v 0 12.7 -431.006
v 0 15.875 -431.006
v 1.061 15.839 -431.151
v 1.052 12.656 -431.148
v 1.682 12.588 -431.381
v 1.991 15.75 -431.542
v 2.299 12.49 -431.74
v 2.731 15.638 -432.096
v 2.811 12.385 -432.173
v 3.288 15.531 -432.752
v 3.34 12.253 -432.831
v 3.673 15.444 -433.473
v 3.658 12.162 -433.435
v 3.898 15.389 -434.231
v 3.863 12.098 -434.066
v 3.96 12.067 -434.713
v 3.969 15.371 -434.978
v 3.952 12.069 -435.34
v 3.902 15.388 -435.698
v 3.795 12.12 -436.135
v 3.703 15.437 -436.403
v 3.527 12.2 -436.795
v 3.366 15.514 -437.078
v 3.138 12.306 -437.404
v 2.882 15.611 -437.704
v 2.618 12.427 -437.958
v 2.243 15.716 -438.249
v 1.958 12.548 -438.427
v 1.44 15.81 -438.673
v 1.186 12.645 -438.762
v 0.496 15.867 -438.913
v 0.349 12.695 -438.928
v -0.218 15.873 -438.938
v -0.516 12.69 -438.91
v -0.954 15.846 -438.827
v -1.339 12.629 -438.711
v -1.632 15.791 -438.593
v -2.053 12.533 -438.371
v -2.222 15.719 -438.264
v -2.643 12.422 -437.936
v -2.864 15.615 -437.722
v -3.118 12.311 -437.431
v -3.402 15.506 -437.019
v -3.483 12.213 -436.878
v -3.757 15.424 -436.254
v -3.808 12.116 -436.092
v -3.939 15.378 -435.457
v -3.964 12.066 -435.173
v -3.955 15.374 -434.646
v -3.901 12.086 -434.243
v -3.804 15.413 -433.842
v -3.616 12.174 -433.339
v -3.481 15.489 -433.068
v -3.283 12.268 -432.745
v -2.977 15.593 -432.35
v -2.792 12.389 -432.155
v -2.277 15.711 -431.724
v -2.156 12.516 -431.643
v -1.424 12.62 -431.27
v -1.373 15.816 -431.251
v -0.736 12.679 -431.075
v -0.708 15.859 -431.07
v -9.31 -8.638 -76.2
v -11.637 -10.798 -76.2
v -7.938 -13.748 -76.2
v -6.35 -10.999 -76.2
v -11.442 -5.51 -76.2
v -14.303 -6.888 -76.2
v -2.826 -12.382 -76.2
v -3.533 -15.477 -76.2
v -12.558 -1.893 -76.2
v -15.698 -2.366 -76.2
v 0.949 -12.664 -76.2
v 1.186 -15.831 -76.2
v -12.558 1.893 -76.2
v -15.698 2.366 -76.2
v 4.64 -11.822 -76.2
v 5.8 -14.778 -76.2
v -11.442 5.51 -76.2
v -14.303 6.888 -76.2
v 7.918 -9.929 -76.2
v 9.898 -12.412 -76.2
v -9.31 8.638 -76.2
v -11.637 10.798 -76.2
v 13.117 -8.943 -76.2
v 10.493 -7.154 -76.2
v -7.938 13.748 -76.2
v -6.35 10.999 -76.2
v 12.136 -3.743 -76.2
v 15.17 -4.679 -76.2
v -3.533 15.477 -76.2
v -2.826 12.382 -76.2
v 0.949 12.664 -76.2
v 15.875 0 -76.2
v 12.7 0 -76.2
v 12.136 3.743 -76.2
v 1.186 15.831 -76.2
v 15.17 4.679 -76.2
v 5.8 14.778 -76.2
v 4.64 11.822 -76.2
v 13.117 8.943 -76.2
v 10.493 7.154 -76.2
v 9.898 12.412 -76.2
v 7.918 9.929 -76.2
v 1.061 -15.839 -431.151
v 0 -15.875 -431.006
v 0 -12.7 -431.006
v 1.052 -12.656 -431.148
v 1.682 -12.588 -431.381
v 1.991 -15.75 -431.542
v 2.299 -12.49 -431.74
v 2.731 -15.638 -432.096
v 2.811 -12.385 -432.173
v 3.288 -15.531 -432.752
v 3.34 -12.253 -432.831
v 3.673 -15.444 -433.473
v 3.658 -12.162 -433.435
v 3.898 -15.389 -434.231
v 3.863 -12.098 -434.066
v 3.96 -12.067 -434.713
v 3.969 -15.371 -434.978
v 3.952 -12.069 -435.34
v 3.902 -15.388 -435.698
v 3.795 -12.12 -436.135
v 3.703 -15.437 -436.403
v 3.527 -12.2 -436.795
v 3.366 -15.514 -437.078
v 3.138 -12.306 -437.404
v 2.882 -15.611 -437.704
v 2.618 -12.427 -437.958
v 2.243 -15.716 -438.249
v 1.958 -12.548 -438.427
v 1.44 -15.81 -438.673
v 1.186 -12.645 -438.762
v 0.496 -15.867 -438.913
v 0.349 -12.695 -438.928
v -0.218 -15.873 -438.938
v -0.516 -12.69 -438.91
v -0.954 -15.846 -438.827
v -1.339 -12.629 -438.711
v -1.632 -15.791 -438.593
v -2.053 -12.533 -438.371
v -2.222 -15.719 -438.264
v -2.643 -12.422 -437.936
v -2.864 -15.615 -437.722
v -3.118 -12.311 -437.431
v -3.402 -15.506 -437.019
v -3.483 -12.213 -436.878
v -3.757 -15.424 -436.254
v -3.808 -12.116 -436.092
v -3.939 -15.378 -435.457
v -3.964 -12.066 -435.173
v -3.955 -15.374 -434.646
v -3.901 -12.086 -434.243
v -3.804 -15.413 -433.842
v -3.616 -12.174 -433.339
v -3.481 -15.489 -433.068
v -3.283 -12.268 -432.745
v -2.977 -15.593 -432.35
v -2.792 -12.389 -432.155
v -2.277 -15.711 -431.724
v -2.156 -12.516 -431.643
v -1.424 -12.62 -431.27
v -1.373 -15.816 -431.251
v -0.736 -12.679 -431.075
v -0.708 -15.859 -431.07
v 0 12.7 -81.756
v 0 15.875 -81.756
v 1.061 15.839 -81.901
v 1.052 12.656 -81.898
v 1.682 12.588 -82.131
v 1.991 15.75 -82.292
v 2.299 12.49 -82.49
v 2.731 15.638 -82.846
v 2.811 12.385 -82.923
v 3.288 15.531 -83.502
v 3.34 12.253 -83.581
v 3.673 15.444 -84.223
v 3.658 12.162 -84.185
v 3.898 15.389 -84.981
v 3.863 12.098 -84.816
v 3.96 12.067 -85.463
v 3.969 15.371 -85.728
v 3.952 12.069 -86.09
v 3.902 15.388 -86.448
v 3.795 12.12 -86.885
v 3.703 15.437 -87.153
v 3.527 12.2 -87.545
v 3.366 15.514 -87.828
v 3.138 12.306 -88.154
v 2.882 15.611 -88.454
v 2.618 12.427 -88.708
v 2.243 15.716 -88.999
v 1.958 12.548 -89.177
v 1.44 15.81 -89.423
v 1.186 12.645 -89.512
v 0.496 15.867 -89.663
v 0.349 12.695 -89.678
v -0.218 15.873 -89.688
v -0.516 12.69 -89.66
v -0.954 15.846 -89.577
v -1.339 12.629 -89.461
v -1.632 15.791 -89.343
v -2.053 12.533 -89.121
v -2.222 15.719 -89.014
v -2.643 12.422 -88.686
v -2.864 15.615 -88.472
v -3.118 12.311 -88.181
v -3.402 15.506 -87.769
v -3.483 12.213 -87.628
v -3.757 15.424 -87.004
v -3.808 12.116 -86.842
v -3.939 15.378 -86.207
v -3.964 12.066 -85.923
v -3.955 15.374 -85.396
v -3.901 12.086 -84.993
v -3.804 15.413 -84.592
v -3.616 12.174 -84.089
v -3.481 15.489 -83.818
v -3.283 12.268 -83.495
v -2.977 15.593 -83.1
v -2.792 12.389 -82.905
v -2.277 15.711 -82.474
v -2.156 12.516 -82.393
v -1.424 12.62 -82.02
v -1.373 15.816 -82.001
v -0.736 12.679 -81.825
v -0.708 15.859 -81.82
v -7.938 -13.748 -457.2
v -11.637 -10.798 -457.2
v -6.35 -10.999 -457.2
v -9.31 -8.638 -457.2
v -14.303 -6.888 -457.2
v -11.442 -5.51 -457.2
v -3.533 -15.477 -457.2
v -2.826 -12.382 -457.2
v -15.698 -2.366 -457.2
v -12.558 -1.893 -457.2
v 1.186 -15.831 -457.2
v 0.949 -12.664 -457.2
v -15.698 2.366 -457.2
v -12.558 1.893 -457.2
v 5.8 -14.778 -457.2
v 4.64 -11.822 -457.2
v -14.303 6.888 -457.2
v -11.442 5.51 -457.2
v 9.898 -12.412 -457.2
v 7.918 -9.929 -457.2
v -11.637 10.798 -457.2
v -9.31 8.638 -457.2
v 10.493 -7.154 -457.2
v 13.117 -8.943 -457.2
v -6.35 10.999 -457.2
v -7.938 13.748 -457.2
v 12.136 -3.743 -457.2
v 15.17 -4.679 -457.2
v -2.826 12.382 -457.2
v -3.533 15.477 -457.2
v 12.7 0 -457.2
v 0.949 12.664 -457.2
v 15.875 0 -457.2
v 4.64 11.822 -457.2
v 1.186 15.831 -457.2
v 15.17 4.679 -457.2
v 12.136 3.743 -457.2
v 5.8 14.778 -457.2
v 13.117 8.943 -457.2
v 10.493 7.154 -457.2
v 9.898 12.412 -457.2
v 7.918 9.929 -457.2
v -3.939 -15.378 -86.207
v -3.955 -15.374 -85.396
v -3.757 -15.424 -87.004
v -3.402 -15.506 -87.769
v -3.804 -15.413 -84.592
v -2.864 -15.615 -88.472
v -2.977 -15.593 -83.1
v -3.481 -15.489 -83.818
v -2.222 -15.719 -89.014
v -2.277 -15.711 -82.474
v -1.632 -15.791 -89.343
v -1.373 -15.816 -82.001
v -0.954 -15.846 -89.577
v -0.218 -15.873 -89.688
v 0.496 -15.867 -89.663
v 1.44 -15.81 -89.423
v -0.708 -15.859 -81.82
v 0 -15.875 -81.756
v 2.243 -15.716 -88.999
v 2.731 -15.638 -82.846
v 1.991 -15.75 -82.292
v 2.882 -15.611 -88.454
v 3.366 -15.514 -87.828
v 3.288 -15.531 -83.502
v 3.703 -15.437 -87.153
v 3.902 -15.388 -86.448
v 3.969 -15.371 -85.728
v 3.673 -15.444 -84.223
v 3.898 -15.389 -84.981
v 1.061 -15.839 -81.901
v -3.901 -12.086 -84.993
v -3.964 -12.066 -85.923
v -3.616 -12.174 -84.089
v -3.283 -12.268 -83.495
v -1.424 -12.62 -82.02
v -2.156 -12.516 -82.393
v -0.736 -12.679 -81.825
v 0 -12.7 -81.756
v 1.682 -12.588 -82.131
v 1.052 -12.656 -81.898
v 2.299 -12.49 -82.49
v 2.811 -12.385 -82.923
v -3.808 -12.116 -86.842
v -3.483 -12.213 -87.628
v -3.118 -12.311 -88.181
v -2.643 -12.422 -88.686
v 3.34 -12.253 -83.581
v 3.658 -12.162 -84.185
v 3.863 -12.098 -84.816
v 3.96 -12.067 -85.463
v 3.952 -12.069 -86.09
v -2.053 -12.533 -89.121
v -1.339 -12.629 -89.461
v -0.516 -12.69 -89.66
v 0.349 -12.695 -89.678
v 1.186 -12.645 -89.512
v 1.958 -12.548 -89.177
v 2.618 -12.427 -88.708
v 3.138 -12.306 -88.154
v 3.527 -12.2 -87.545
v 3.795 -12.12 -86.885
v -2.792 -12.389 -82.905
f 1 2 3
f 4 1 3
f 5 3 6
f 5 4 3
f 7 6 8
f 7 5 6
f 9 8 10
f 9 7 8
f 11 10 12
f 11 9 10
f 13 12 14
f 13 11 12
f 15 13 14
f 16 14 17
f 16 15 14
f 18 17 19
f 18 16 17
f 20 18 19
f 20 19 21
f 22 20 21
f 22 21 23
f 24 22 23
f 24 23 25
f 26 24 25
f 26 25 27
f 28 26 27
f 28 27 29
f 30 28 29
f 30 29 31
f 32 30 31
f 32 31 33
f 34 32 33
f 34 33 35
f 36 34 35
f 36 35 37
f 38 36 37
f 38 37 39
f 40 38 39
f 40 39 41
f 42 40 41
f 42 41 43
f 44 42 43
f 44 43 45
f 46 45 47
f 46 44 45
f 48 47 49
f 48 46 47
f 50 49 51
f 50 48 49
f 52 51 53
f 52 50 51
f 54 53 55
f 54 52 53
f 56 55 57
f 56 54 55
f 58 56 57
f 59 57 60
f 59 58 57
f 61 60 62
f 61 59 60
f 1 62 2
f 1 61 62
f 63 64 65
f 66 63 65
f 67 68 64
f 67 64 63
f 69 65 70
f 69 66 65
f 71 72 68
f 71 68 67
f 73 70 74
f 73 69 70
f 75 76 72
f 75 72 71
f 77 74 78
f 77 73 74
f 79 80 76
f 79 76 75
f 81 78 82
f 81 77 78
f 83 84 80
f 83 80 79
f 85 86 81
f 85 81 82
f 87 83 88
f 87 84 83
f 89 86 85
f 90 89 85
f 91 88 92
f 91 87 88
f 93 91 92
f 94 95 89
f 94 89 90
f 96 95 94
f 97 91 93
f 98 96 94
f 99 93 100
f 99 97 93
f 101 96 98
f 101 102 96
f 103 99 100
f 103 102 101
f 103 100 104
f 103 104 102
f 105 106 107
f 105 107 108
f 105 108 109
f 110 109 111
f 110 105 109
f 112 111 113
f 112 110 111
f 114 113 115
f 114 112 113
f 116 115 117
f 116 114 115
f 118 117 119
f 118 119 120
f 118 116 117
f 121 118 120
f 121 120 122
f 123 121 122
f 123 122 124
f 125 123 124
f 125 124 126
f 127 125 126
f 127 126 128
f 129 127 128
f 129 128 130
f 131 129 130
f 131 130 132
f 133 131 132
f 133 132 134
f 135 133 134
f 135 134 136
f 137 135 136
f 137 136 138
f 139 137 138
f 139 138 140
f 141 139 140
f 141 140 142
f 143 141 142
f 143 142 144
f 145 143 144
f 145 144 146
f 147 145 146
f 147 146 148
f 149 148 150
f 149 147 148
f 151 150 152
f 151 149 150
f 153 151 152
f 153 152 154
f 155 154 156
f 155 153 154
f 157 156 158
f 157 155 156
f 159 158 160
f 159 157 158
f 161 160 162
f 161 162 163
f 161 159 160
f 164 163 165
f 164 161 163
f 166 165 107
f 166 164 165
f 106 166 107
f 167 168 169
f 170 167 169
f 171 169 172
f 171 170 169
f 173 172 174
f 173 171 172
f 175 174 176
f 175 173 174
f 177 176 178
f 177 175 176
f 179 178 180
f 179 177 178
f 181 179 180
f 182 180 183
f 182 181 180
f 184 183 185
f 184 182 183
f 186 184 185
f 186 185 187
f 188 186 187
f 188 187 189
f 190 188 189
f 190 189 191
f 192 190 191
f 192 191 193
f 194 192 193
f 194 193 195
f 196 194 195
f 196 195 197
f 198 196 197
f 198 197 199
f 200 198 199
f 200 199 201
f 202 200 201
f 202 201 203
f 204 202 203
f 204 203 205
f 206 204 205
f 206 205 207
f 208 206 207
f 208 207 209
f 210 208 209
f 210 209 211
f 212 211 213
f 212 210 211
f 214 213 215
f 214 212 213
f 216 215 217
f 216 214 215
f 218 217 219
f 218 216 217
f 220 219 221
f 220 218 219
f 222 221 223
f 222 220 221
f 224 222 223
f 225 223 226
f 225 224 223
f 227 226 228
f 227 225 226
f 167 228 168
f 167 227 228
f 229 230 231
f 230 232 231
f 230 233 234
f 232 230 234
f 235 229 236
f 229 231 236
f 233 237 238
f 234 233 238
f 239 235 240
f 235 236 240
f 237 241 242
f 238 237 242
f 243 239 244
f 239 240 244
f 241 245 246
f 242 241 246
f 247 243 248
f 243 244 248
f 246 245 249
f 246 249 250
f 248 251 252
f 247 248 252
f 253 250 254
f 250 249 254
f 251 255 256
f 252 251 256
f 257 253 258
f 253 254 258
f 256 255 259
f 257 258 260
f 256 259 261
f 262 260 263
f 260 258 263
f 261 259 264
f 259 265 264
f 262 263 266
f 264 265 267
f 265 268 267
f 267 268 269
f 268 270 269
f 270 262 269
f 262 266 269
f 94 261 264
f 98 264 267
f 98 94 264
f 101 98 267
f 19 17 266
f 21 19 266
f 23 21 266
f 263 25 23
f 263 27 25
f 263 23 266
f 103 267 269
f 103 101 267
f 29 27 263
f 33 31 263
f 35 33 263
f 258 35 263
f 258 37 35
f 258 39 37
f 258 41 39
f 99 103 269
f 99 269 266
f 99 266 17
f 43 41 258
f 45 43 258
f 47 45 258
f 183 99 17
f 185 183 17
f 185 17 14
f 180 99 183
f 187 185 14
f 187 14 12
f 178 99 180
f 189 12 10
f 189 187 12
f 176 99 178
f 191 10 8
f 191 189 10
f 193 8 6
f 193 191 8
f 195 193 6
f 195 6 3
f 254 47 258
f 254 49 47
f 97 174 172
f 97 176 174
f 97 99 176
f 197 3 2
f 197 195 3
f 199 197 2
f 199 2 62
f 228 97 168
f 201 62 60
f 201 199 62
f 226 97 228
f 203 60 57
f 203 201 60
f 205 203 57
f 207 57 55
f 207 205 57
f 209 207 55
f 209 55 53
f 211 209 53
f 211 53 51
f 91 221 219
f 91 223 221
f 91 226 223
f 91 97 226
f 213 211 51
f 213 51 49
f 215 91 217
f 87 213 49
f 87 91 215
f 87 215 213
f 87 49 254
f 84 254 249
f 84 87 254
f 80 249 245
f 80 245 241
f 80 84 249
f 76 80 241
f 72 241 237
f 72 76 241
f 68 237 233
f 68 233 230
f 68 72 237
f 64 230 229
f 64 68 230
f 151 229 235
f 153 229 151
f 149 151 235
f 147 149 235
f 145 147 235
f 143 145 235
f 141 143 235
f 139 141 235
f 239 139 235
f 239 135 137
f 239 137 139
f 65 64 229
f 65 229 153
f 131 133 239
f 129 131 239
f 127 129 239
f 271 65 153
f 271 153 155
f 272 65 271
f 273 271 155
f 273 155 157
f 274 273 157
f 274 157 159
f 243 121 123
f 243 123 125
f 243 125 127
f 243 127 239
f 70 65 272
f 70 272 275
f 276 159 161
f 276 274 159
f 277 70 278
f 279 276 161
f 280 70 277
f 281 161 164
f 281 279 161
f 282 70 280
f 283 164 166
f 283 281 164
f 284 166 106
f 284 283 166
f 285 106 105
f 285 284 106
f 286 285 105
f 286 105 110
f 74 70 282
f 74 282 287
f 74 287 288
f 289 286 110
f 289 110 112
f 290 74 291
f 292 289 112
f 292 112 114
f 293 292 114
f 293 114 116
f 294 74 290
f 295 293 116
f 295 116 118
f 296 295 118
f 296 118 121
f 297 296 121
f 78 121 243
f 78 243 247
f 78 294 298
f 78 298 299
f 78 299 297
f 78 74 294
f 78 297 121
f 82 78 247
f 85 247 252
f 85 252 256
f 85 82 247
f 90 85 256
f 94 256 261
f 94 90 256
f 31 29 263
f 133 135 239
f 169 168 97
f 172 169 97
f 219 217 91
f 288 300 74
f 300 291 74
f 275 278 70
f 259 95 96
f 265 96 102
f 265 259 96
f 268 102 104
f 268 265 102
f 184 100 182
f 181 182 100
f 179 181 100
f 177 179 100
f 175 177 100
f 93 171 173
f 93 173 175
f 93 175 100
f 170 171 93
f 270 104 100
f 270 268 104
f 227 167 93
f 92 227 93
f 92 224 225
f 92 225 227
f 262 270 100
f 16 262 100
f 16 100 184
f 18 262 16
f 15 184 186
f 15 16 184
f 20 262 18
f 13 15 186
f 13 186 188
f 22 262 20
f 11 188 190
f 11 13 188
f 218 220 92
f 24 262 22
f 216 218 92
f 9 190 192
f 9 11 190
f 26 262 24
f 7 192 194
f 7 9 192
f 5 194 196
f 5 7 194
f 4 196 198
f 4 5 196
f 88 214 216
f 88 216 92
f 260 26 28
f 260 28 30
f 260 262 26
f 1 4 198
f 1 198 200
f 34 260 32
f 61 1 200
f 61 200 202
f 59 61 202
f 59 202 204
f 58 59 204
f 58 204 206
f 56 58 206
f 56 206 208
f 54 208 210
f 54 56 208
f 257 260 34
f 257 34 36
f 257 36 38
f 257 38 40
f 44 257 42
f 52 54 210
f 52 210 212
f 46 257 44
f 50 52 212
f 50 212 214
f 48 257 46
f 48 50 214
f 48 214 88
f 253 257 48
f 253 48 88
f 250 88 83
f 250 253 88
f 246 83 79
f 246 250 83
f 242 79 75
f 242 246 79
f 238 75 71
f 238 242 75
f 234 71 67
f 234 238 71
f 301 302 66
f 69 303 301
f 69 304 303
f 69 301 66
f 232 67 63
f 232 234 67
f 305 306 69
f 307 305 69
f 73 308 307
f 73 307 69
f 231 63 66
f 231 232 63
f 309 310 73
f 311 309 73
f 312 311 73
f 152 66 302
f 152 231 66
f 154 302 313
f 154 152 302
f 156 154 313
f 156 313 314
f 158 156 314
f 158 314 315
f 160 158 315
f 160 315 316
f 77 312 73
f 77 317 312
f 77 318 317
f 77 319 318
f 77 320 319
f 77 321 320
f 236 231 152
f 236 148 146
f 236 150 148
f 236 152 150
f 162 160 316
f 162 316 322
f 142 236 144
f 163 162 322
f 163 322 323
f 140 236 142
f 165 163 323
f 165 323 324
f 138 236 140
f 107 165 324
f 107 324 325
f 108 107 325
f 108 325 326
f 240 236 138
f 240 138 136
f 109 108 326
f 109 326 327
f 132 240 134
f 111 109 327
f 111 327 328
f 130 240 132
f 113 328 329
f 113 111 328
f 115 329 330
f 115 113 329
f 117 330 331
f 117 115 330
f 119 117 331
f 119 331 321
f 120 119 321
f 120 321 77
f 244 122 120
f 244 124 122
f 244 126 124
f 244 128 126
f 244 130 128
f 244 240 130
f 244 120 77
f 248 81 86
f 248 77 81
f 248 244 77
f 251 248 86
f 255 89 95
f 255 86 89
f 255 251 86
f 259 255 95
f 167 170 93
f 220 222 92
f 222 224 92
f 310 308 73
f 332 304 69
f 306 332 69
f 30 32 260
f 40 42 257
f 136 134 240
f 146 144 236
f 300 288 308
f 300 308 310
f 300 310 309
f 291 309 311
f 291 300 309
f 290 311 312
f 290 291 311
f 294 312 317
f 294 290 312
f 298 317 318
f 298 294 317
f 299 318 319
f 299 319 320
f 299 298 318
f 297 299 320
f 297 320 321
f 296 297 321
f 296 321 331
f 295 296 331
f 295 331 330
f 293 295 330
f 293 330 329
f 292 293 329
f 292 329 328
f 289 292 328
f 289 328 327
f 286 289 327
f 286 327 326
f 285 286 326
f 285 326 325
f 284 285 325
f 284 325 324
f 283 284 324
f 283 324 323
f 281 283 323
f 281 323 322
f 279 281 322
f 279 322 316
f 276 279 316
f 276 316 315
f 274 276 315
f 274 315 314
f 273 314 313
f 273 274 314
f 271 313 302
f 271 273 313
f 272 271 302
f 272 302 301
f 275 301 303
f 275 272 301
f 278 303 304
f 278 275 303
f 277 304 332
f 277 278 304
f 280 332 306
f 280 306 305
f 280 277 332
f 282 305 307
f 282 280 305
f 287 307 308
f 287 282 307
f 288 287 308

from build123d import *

# Parameters (mm, degrees)
SKETCH3_R               = 15.875
SKETCH3_R_2             = 12.7
BOSS_EXTRUDE1_DEPTH     = 457.2
SKETCH4_R               = 24.687530181
CUT_EXTRUDE1_DEPTH      = 533.4
CUT_EXTRUDE2_DEPTH      = 458.750883396
CUT_EXTRUDE2_DEPTH_BACK = 458.750883396
SKETCH5_R               = 3.96875


with BuildPart() as part:
    # Sketch3 → Boss-Extrude1 (new, symmetric)
    with BuildSketch(Plane.XY):
        Circle(SKETCH3_R)
        Circle(SKETCH3_R_2, mode=Mode.SUBTRACT)
    extrude(amount=BOSS_EXTRUDE1_DEPTH, both=True)

    # Sketch4 → Cut-Extrude1 (cut)
    with BuildSketch(Plane.XY.offset(457.2)):
        Circle(SKETCH4_R)
    extrude(amount=-CUT_EXTRUDE1_DEPTH, mode=Mode.SUBTRACT)

    # Sketch5 → Cut-Extrude2 (cut, two sides: drawn at the far end of the back side and taken through both)
    with BuildSketch(Plane(origin=(0, 0, 0), x_dir=(1, 0, 0), z_dir=(0, 1, 0)).offset(-CUT_EXTRUDE2_DEPTH_BACK)):
        with Locations(Location((0, 85.725, 0), (0, 0, 270))):
            Circle(SKETCH5_R)
        with Locations(Location((0, 434.975, 0), (0, 0, 270))):
            Circle(SKETCH5_R)
    extrude(amount=CUT_EXTRUDE2_DEPTH + CUT_EXTRUDE2_DEPTH_BACK, mode=Mode.SUBTRACT)


solid = part.part
